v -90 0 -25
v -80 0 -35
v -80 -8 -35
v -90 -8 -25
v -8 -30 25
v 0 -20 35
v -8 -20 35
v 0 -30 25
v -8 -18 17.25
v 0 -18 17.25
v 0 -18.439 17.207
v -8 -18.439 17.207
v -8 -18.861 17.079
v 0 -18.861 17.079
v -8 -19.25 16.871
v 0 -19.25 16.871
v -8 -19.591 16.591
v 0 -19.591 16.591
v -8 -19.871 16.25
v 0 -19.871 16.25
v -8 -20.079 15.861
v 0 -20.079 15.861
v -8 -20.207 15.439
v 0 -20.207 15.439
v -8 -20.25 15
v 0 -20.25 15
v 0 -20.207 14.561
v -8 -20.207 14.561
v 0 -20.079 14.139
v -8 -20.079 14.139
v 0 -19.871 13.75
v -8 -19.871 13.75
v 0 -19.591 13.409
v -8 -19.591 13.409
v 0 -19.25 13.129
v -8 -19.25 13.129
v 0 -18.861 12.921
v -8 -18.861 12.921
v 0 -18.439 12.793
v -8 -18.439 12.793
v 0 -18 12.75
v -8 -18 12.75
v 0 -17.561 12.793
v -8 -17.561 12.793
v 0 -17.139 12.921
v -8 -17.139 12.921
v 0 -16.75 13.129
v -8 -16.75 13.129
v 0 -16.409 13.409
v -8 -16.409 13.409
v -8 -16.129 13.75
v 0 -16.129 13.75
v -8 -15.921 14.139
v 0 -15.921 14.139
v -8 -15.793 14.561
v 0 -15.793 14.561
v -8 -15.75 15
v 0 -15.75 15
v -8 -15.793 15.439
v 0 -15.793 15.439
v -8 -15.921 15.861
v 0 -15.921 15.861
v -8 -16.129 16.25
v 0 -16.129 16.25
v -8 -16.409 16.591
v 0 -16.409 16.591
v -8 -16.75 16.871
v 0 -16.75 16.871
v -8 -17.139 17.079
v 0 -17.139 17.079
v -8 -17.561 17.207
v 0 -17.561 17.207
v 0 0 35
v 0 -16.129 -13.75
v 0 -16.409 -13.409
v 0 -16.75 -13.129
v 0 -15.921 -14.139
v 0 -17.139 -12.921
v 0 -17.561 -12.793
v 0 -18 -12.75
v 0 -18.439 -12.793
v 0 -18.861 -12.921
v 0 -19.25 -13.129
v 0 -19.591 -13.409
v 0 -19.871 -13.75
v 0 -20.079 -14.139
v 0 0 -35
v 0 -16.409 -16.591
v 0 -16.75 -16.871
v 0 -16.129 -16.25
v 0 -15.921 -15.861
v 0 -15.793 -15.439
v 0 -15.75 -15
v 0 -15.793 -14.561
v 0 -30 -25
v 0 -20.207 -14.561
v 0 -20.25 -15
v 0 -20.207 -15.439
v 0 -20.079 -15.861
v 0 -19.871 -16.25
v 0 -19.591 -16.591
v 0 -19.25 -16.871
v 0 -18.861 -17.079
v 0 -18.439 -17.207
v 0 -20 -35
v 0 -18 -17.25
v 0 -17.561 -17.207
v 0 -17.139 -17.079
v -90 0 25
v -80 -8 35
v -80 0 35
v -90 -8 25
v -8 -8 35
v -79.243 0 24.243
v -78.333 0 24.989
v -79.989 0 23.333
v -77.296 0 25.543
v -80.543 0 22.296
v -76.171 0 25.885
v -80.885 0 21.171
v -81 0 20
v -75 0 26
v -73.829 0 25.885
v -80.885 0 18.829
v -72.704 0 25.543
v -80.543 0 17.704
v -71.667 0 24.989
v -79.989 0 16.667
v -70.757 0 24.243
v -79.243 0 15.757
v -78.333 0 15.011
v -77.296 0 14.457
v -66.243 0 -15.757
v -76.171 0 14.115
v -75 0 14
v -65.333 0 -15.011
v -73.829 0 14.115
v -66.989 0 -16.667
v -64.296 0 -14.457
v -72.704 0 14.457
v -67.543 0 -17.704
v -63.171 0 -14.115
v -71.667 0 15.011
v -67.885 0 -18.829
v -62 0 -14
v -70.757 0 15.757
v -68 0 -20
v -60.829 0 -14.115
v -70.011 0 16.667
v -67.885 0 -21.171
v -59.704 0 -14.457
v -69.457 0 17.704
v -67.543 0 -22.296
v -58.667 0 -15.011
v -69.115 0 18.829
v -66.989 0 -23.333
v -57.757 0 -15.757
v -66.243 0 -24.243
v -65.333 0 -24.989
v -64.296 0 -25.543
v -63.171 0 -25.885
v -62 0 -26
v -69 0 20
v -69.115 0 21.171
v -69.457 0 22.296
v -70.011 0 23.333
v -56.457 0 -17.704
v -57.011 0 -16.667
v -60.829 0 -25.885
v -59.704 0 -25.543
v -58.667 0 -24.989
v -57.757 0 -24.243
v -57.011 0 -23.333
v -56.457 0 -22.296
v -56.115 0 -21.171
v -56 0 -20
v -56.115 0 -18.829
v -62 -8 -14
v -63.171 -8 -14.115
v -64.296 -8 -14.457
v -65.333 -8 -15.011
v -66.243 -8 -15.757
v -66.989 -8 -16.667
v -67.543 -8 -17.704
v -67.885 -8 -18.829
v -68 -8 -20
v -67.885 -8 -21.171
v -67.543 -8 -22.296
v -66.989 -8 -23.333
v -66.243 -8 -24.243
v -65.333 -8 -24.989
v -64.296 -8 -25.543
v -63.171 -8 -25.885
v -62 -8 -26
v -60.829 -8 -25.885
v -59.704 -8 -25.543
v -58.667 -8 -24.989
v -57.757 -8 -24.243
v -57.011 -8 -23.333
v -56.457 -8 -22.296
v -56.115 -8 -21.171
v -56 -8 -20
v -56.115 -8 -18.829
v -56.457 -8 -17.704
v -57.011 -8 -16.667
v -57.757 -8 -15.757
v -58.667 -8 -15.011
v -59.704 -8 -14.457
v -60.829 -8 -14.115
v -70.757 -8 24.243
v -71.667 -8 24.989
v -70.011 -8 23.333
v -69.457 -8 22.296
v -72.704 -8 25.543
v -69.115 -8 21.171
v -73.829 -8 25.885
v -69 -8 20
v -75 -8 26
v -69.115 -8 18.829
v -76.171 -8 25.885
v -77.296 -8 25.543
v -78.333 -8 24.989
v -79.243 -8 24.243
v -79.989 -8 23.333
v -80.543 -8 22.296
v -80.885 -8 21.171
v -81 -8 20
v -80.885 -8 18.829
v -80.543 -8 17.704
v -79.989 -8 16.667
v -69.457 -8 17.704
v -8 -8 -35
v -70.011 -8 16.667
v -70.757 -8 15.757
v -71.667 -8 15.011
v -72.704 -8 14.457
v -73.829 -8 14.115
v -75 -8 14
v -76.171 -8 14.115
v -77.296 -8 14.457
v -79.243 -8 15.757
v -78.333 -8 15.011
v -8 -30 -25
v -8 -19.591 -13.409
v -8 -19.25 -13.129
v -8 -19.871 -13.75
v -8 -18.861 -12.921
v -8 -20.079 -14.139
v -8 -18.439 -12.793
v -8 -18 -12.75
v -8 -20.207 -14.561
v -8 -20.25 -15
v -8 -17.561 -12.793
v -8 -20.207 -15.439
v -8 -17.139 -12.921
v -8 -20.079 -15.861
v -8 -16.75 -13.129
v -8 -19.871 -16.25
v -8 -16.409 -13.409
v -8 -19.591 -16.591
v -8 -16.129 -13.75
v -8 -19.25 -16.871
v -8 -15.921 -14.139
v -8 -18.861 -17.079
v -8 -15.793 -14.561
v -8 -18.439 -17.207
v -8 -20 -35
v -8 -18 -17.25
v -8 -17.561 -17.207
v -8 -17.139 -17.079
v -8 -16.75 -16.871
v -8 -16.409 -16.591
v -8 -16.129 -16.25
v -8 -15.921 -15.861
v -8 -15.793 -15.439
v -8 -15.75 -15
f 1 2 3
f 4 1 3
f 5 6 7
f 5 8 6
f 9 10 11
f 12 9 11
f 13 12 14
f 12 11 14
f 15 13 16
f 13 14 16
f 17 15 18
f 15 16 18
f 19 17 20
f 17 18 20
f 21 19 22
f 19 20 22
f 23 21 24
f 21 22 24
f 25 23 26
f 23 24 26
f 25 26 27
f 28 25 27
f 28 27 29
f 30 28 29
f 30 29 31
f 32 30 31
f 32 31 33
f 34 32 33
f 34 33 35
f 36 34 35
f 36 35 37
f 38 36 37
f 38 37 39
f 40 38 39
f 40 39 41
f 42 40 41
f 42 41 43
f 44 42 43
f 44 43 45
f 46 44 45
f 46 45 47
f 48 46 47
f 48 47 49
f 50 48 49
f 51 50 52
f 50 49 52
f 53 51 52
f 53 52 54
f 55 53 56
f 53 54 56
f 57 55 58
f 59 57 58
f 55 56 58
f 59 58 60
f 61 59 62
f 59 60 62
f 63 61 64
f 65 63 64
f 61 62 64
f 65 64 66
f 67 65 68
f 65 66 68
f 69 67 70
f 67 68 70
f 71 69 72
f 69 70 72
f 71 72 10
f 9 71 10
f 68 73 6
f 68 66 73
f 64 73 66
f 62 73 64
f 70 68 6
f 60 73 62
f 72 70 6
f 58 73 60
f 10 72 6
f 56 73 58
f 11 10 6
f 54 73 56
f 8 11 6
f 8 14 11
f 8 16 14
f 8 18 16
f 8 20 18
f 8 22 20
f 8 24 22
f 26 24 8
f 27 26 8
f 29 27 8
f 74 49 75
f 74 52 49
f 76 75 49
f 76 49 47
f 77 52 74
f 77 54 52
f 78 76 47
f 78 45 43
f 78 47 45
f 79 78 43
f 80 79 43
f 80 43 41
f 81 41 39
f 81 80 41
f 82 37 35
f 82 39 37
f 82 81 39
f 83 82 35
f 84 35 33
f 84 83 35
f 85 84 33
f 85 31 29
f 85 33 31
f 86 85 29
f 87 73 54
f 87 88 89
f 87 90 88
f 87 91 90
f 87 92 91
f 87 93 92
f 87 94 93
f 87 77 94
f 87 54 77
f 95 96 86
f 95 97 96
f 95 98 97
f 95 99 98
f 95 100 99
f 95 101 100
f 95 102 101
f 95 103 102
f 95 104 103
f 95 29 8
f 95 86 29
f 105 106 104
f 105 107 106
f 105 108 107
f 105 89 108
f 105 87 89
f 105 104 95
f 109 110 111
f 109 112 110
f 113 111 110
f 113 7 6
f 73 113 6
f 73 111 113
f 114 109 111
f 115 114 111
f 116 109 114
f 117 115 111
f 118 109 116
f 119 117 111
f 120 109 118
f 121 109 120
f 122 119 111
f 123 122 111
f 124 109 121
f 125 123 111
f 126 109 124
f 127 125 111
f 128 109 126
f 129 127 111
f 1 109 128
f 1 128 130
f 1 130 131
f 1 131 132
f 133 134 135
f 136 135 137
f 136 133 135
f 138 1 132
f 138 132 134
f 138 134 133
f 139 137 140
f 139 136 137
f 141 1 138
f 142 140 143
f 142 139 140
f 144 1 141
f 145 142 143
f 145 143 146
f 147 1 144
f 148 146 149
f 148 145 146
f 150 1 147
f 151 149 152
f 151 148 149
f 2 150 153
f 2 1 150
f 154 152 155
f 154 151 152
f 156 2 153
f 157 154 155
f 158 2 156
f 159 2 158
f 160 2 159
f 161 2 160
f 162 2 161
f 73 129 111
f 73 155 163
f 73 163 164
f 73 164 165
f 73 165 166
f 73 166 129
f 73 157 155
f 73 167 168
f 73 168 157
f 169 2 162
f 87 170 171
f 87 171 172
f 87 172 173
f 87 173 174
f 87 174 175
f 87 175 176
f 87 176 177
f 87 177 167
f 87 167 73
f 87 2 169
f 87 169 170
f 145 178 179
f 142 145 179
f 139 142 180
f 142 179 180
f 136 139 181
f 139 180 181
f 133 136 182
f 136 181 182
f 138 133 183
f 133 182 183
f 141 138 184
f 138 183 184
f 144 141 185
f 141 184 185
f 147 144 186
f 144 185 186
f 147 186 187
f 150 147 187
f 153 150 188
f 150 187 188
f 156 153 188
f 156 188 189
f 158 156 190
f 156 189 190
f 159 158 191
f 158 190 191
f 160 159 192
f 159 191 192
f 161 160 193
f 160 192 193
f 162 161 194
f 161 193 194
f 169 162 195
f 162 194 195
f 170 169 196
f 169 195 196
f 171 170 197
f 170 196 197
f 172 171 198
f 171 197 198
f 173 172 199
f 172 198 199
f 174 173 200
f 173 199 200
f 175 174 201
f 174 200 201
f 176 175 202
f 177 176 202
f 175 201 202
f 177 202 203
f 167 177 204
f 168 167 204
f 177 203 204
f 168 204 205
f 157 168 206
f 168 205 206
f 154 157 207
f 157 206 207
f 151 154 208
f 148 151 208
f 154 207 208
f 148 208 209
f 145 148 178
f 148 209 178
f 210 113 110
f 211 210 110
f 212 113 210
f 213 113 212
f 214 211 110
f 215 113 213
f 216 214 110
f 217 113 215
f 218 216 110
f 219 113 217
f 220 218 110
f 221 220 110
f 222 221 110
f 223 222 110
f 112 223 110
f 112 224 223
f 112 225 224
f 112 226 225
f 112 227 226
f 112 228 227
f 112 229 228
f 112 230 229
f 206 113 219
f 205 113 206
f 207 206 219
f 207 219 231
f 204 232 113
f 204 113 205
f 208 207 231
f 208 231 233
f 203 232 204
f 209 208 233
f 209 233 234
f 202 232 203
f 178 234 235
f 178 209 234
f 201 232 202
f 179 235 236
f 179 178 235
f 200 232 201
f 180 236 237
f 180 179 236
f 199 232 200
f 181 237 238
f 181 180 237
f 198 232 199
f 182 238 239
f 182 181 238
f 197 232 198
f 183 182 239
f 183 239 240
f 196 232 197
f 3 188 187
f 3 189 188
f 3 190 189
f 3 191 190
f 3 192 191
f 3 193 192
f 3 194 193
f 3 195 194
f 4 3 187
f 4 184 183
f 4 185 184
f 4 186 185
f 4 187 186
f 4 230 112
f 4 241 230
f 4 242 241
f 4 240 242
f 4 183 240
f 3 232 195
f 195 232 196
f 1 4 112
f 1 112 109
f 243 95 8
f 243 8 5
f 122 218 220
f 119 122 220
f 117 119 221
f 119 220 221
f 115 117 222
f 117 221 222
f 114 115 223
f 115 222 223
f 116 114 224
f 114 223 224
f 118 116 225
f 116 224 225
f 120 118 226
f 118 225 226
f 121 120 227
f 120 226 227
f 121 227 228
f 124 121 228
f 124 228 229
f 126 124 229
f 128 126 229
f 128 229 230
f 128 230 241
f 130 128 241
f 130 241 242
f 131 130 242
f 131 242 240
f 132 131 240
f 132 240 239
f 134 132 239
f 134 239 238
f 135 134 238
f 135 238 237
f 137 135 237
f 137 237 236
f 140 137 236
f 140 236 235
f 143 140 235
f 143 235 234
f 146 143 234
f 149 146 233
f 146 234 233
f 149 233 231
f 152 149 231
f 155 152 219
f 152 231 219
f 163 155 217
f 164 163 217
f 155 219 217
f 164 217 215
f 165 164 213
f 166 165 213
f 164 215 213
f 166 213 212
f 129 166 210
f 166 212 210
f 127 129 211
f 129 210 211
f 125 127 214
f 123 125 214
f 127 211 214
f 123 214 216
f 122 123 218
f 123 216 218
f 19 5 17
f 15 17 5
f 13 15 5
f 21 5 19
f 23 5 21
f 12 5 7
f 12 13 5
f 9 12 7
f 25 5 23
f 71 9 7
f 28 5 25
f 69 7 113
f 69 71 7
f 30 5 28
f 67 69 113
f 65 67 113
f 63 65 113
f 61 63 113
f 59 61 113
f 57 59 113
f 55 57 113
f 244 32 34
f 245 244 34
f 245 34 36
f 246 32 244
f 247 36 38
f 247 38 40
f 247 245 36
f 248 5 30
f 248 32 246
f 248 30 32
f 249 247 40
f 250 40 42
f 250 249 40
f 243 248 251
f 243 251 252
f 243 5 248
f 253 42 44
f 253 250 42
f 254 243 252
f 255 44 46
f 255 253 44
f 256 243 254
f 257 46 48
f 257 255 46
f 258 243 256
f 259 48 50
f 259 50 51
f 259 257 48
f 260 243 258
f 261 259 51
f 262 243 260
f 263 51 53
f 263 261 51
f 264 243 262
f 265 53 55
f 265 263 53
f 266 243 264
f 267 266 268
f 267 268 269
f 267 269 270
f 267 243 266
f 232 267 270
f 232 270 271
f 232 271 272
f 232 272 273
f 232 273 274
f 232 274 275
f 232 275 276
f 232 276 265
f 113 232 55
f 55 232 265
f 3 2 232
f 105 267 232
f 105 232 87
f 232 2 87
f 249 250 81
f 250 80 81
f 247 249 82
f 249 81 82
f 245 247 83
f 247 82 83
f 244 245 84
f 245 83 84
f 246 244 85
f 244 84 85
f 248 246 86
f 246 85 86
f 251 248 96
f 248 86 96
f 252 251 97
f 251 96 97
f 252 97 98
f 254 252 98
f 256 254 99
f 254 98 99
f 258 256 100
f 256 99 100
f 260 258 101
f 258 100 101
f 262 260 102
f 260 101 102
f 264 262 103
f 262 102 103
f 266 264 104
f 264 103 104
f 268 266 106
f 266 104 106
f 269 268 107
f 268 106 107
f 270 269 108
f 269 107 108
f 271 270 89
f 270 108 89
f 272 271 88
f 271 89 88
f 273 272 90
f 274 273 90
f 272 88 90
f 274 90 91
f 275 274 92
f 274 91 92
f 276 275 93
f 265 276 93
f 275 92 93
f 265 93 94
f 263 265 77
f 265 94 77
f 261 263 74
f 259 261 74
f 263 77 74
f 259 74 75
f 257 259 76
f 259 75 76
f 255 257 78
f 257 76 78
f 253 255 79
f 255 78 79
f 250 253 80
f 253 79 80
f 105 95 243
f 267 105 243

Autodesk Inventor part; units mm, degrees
ref_plane "YZ Plane" through (0, 0, 0) normal (1, 0, 0) x (0, 1, 0)
ref_plane "XZ Plane" through (0, 0, 0) normal (0, 1, 0) x (-1, 0, 0)
ref_plane "XY Plane" through (0, 0, 0) normal (0, 0, 1) x (1, 0, 0)
sketch "Esboço1" plane through (0, 0, 0) normal (0, 0, 1) x (1, 0, 0)
  line L0 (-90, 0) -> (0, 0)
  line L1 (0, 0) -> (0, -30)
  line L2 (0, -30) -> (-8, -30)
  line L3 (-8, -30) -> (-8, -8)
  line L4 (-8, -8) -> (-90, -8)
  line L5 (-90, -8) -> (-90, 0)
  dimension "d0" = 90
  dimension "d1" = 30
  dimension "d2" = 8
  dimension "d3" = 8
extrude "Extrusão1" add sketch "Esboço1" along normal mid plane 70
sketch "Esboço2" plane through (-90, 0, 35) normal (0, 1, 0) x (1, 0, 0)
  line L0 (0, 70) -> (0, 0) projected
  line L1 (90, 0) -> (0, 0) projected
  line L2 (0, 70) -> (90, 70) projected
  point P0 (90, 35)
  point P1 (28, 55)
  point P2 (15, 15)
  dimension "d6" = 28
  dimension "d7" = 15
  dimension "d8" = 15
  dimension "d9" = 15
hole "Furo1" at (-62, 0, -20) at (-75, 0, 20) direction (0, -1, 0) diameter 12 end through all
sketch "Esboço3" plane through (-8, -30, 35) normal (-1, 0, 0) x (0, 0, 1)
  line L0 (-70, 0) -> (0, 0) projected
  line L1 (0, 22) -> (0, 0) projected
  line L2 (-70, 0) -> (-70, 22) projected
  point P0 (-35, 30)
  point P1 (-50, 12)
  point P2 (-20, 12)
  dimension "d17" = 12
  dimension "d18" = 20
  dimension "d19" = 20
hole "Furo2" at (-8, -18, -15) at (-8, -18, 15) direction (1, 0, 0) diameter 4.5 end through all
chamfer "Chanfro1" distance 10 angle 45 4 edges at (-90, -4, -35) (-90, -4, 35) (-4, -30, -35) (-4, -30, 35)
